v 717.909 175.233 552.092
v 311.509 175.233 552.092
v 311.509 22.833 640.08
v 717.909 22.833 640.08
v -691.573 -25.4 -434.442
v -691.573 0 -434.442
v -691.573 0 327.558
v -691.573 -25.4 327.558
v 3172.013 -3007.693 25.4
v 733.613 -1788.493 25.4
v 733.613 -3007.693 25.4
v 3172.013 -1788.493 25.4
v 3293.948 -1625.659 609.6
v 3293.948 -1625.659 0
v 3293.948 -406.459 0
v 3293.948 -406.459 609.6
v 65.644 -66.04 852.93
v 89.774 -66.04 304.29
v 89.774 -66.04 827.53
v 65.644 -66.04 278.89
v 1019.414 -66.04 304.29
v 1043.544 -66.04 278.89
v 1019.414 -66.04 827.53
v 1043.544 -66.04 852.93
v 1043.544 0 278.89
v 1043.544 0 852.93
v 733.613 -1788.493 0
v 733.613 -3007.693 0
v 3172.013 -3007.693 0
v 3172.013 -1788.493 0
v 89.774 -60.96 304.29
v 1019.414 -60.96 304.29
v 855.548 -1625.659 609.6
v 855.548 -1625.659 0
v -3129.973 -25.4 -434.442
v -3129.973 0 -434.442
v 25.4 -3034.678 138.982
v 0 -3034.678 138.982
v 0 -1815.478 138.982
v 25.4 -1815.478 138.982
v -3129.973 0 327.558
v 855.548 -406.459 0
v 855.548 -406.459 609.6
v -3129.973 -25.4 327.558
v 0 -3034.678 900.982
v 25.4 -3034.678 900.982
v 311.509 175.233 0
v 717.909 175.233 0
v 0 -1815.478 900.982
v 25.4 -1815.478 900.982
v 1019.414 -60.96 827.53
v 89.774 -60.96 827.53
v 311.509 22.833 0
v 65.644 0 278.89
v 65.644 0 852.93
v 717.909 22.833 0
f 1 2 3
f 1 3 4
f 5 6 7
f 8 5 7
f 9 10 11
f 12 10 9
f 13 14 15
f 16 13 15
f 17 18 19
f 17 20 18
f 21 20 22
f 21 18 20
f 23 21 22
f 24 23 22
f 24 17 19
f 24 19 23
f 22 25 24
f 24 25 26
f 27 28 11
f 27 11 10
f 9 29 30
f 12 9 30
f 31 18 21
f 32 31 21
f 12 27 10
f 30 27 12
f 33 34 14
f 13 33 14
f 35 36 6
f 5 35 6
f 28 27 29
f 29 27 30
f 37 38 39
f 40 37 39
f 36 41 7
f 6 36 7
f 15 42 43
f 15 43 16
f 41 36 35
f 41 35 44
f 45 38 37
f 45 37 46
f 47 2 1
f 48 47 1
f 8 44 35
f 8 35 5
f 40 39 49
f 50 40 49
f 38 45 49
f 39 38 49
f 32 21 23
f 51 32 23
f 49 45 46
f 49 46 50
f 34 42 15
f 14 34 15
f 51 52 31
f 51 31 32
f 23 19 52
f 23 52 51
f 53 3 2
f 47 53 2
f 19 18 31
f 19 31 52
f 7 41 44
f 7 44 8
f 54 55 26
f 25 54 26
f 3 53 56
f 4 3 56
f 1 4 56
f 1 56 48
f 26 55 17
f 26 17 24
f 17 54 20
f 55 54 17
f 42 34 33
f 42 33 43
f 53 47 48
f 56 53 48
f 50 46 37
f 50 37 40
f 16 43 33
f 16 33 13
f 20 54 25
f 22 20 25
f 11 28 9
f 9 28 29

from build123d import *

# Parameters (mm, degrees)
F1_W      = 977.9
F1_H      = 574.04
F2_DEPTH  = 66.04
F3_W      = 929.64
F3_H      = 523.24
F4_DEPTH  = 5.08
F5_W      = 2438.4
F5_H      = 1219.2
F6_DEPTH  = 609.6
F7_W      = 2438.4
F7_H      = 1219.2
F8_DEPTH  = 25.4
F9_W      = 2438.4
F9_H      = 762
F10_DEPTH = 25.4
F11_W     = 1219.2
F11_H     = 762
F12_DEPTH = 25.4
F13_W     = 406.4
F13_H     = 152.4
F14_DEPTH = 640.08
F15_SIZE2 = 87.988171
F15_SIZE  = 152.39999


# Not quite as in the source:
# - a fillet or chamfer is up to 0.001 mm smaller than in the source, because OpenCascade refuses the exact size


with BuildPart() as f2:
    # F1 (on Front) → F2 (new body)
    with BuildSketch(Plane.XZ):
        with Locations((554.5943079948, 565.9104996113)):
            Rectangle(F1_W, F1_H)
    extrude(amount=F2_DEPTH)

    # F3 (on face) → F4 (cut)
    with BuildSketch(Plane.XZ.offset(66.04)):
        with Locations((554.5943079948, 565.9104996113)):
            Rectangle(F3_W, F3_H)
    extrude(amount=-F4_DEPTH, mode=Mode.SUBTRACT)


with BuildPart() as f6:
    # F5 (on face) → F6 (new body)
    with BuildSketch(Plane.XY):
        with Locations((2074.7481584549, -1016.0588382279)):
            Rectangle(F5_W, F5_H)
    extrude(amount=F6_DEPTH)


with BuildPart() as f8:
    # F7 (on face) → F8 (new body)
    with BuildSketch(Plane.XY):
        with Locations((1952.8129696846, -2398.0931629392)):
            Rectangle(F7_W, F7_H)
    extrude(amount=F8_DEPTH)


with BuildPart() as f10:
    # F9 (on Front) → F10 (new body)
    with BuildSketch(Plane.XZ):
        with Locations((-1910.7732921839, -53.4418959455)):
            Rectangle(F9_W, F9_H)
    extrude(amount=F10_DEPTH)


with BuildPart() as f12:
    # F11 (on Right) → F12 (new body)
    with BuildSketch(Plane.YZ):
        with Locations((-2425.0782728195, 519.9815827243)):
            Rectangle(F11_W, F11_H)
    extrude(amount=F12_DEPTH)


with BuildPart() as f14:
    # F13 (on face) → F14 (new body)
    with BuildSketch(Plane.XY):
        with Locations((514.7094428539, 99.033133836)):
            Rectangle(F13_W, F13_H)
    extrude(amount=F14_DEPTH)

    # F15 (size 152.4 and 87.9881810245 in the source; OpenCascade refuses exactly that, so slightly less here)
    f15_edges = [f14.edges().sort_by_distance(p)[0] for p in [
        (514.709443, 175.233134, 640.08),
    ]]
    f15_side = f14.faces().sort_by_distance((514.709443, 99.033134, 640.08))[0]
    chamfer(f15_edges, length=F15_SIZE, length2=F15_SIZE2, reference=f15_side)


solid = Compound([f2.part, f6.part, f8.part, f10.part, f12.part, f14.part])
